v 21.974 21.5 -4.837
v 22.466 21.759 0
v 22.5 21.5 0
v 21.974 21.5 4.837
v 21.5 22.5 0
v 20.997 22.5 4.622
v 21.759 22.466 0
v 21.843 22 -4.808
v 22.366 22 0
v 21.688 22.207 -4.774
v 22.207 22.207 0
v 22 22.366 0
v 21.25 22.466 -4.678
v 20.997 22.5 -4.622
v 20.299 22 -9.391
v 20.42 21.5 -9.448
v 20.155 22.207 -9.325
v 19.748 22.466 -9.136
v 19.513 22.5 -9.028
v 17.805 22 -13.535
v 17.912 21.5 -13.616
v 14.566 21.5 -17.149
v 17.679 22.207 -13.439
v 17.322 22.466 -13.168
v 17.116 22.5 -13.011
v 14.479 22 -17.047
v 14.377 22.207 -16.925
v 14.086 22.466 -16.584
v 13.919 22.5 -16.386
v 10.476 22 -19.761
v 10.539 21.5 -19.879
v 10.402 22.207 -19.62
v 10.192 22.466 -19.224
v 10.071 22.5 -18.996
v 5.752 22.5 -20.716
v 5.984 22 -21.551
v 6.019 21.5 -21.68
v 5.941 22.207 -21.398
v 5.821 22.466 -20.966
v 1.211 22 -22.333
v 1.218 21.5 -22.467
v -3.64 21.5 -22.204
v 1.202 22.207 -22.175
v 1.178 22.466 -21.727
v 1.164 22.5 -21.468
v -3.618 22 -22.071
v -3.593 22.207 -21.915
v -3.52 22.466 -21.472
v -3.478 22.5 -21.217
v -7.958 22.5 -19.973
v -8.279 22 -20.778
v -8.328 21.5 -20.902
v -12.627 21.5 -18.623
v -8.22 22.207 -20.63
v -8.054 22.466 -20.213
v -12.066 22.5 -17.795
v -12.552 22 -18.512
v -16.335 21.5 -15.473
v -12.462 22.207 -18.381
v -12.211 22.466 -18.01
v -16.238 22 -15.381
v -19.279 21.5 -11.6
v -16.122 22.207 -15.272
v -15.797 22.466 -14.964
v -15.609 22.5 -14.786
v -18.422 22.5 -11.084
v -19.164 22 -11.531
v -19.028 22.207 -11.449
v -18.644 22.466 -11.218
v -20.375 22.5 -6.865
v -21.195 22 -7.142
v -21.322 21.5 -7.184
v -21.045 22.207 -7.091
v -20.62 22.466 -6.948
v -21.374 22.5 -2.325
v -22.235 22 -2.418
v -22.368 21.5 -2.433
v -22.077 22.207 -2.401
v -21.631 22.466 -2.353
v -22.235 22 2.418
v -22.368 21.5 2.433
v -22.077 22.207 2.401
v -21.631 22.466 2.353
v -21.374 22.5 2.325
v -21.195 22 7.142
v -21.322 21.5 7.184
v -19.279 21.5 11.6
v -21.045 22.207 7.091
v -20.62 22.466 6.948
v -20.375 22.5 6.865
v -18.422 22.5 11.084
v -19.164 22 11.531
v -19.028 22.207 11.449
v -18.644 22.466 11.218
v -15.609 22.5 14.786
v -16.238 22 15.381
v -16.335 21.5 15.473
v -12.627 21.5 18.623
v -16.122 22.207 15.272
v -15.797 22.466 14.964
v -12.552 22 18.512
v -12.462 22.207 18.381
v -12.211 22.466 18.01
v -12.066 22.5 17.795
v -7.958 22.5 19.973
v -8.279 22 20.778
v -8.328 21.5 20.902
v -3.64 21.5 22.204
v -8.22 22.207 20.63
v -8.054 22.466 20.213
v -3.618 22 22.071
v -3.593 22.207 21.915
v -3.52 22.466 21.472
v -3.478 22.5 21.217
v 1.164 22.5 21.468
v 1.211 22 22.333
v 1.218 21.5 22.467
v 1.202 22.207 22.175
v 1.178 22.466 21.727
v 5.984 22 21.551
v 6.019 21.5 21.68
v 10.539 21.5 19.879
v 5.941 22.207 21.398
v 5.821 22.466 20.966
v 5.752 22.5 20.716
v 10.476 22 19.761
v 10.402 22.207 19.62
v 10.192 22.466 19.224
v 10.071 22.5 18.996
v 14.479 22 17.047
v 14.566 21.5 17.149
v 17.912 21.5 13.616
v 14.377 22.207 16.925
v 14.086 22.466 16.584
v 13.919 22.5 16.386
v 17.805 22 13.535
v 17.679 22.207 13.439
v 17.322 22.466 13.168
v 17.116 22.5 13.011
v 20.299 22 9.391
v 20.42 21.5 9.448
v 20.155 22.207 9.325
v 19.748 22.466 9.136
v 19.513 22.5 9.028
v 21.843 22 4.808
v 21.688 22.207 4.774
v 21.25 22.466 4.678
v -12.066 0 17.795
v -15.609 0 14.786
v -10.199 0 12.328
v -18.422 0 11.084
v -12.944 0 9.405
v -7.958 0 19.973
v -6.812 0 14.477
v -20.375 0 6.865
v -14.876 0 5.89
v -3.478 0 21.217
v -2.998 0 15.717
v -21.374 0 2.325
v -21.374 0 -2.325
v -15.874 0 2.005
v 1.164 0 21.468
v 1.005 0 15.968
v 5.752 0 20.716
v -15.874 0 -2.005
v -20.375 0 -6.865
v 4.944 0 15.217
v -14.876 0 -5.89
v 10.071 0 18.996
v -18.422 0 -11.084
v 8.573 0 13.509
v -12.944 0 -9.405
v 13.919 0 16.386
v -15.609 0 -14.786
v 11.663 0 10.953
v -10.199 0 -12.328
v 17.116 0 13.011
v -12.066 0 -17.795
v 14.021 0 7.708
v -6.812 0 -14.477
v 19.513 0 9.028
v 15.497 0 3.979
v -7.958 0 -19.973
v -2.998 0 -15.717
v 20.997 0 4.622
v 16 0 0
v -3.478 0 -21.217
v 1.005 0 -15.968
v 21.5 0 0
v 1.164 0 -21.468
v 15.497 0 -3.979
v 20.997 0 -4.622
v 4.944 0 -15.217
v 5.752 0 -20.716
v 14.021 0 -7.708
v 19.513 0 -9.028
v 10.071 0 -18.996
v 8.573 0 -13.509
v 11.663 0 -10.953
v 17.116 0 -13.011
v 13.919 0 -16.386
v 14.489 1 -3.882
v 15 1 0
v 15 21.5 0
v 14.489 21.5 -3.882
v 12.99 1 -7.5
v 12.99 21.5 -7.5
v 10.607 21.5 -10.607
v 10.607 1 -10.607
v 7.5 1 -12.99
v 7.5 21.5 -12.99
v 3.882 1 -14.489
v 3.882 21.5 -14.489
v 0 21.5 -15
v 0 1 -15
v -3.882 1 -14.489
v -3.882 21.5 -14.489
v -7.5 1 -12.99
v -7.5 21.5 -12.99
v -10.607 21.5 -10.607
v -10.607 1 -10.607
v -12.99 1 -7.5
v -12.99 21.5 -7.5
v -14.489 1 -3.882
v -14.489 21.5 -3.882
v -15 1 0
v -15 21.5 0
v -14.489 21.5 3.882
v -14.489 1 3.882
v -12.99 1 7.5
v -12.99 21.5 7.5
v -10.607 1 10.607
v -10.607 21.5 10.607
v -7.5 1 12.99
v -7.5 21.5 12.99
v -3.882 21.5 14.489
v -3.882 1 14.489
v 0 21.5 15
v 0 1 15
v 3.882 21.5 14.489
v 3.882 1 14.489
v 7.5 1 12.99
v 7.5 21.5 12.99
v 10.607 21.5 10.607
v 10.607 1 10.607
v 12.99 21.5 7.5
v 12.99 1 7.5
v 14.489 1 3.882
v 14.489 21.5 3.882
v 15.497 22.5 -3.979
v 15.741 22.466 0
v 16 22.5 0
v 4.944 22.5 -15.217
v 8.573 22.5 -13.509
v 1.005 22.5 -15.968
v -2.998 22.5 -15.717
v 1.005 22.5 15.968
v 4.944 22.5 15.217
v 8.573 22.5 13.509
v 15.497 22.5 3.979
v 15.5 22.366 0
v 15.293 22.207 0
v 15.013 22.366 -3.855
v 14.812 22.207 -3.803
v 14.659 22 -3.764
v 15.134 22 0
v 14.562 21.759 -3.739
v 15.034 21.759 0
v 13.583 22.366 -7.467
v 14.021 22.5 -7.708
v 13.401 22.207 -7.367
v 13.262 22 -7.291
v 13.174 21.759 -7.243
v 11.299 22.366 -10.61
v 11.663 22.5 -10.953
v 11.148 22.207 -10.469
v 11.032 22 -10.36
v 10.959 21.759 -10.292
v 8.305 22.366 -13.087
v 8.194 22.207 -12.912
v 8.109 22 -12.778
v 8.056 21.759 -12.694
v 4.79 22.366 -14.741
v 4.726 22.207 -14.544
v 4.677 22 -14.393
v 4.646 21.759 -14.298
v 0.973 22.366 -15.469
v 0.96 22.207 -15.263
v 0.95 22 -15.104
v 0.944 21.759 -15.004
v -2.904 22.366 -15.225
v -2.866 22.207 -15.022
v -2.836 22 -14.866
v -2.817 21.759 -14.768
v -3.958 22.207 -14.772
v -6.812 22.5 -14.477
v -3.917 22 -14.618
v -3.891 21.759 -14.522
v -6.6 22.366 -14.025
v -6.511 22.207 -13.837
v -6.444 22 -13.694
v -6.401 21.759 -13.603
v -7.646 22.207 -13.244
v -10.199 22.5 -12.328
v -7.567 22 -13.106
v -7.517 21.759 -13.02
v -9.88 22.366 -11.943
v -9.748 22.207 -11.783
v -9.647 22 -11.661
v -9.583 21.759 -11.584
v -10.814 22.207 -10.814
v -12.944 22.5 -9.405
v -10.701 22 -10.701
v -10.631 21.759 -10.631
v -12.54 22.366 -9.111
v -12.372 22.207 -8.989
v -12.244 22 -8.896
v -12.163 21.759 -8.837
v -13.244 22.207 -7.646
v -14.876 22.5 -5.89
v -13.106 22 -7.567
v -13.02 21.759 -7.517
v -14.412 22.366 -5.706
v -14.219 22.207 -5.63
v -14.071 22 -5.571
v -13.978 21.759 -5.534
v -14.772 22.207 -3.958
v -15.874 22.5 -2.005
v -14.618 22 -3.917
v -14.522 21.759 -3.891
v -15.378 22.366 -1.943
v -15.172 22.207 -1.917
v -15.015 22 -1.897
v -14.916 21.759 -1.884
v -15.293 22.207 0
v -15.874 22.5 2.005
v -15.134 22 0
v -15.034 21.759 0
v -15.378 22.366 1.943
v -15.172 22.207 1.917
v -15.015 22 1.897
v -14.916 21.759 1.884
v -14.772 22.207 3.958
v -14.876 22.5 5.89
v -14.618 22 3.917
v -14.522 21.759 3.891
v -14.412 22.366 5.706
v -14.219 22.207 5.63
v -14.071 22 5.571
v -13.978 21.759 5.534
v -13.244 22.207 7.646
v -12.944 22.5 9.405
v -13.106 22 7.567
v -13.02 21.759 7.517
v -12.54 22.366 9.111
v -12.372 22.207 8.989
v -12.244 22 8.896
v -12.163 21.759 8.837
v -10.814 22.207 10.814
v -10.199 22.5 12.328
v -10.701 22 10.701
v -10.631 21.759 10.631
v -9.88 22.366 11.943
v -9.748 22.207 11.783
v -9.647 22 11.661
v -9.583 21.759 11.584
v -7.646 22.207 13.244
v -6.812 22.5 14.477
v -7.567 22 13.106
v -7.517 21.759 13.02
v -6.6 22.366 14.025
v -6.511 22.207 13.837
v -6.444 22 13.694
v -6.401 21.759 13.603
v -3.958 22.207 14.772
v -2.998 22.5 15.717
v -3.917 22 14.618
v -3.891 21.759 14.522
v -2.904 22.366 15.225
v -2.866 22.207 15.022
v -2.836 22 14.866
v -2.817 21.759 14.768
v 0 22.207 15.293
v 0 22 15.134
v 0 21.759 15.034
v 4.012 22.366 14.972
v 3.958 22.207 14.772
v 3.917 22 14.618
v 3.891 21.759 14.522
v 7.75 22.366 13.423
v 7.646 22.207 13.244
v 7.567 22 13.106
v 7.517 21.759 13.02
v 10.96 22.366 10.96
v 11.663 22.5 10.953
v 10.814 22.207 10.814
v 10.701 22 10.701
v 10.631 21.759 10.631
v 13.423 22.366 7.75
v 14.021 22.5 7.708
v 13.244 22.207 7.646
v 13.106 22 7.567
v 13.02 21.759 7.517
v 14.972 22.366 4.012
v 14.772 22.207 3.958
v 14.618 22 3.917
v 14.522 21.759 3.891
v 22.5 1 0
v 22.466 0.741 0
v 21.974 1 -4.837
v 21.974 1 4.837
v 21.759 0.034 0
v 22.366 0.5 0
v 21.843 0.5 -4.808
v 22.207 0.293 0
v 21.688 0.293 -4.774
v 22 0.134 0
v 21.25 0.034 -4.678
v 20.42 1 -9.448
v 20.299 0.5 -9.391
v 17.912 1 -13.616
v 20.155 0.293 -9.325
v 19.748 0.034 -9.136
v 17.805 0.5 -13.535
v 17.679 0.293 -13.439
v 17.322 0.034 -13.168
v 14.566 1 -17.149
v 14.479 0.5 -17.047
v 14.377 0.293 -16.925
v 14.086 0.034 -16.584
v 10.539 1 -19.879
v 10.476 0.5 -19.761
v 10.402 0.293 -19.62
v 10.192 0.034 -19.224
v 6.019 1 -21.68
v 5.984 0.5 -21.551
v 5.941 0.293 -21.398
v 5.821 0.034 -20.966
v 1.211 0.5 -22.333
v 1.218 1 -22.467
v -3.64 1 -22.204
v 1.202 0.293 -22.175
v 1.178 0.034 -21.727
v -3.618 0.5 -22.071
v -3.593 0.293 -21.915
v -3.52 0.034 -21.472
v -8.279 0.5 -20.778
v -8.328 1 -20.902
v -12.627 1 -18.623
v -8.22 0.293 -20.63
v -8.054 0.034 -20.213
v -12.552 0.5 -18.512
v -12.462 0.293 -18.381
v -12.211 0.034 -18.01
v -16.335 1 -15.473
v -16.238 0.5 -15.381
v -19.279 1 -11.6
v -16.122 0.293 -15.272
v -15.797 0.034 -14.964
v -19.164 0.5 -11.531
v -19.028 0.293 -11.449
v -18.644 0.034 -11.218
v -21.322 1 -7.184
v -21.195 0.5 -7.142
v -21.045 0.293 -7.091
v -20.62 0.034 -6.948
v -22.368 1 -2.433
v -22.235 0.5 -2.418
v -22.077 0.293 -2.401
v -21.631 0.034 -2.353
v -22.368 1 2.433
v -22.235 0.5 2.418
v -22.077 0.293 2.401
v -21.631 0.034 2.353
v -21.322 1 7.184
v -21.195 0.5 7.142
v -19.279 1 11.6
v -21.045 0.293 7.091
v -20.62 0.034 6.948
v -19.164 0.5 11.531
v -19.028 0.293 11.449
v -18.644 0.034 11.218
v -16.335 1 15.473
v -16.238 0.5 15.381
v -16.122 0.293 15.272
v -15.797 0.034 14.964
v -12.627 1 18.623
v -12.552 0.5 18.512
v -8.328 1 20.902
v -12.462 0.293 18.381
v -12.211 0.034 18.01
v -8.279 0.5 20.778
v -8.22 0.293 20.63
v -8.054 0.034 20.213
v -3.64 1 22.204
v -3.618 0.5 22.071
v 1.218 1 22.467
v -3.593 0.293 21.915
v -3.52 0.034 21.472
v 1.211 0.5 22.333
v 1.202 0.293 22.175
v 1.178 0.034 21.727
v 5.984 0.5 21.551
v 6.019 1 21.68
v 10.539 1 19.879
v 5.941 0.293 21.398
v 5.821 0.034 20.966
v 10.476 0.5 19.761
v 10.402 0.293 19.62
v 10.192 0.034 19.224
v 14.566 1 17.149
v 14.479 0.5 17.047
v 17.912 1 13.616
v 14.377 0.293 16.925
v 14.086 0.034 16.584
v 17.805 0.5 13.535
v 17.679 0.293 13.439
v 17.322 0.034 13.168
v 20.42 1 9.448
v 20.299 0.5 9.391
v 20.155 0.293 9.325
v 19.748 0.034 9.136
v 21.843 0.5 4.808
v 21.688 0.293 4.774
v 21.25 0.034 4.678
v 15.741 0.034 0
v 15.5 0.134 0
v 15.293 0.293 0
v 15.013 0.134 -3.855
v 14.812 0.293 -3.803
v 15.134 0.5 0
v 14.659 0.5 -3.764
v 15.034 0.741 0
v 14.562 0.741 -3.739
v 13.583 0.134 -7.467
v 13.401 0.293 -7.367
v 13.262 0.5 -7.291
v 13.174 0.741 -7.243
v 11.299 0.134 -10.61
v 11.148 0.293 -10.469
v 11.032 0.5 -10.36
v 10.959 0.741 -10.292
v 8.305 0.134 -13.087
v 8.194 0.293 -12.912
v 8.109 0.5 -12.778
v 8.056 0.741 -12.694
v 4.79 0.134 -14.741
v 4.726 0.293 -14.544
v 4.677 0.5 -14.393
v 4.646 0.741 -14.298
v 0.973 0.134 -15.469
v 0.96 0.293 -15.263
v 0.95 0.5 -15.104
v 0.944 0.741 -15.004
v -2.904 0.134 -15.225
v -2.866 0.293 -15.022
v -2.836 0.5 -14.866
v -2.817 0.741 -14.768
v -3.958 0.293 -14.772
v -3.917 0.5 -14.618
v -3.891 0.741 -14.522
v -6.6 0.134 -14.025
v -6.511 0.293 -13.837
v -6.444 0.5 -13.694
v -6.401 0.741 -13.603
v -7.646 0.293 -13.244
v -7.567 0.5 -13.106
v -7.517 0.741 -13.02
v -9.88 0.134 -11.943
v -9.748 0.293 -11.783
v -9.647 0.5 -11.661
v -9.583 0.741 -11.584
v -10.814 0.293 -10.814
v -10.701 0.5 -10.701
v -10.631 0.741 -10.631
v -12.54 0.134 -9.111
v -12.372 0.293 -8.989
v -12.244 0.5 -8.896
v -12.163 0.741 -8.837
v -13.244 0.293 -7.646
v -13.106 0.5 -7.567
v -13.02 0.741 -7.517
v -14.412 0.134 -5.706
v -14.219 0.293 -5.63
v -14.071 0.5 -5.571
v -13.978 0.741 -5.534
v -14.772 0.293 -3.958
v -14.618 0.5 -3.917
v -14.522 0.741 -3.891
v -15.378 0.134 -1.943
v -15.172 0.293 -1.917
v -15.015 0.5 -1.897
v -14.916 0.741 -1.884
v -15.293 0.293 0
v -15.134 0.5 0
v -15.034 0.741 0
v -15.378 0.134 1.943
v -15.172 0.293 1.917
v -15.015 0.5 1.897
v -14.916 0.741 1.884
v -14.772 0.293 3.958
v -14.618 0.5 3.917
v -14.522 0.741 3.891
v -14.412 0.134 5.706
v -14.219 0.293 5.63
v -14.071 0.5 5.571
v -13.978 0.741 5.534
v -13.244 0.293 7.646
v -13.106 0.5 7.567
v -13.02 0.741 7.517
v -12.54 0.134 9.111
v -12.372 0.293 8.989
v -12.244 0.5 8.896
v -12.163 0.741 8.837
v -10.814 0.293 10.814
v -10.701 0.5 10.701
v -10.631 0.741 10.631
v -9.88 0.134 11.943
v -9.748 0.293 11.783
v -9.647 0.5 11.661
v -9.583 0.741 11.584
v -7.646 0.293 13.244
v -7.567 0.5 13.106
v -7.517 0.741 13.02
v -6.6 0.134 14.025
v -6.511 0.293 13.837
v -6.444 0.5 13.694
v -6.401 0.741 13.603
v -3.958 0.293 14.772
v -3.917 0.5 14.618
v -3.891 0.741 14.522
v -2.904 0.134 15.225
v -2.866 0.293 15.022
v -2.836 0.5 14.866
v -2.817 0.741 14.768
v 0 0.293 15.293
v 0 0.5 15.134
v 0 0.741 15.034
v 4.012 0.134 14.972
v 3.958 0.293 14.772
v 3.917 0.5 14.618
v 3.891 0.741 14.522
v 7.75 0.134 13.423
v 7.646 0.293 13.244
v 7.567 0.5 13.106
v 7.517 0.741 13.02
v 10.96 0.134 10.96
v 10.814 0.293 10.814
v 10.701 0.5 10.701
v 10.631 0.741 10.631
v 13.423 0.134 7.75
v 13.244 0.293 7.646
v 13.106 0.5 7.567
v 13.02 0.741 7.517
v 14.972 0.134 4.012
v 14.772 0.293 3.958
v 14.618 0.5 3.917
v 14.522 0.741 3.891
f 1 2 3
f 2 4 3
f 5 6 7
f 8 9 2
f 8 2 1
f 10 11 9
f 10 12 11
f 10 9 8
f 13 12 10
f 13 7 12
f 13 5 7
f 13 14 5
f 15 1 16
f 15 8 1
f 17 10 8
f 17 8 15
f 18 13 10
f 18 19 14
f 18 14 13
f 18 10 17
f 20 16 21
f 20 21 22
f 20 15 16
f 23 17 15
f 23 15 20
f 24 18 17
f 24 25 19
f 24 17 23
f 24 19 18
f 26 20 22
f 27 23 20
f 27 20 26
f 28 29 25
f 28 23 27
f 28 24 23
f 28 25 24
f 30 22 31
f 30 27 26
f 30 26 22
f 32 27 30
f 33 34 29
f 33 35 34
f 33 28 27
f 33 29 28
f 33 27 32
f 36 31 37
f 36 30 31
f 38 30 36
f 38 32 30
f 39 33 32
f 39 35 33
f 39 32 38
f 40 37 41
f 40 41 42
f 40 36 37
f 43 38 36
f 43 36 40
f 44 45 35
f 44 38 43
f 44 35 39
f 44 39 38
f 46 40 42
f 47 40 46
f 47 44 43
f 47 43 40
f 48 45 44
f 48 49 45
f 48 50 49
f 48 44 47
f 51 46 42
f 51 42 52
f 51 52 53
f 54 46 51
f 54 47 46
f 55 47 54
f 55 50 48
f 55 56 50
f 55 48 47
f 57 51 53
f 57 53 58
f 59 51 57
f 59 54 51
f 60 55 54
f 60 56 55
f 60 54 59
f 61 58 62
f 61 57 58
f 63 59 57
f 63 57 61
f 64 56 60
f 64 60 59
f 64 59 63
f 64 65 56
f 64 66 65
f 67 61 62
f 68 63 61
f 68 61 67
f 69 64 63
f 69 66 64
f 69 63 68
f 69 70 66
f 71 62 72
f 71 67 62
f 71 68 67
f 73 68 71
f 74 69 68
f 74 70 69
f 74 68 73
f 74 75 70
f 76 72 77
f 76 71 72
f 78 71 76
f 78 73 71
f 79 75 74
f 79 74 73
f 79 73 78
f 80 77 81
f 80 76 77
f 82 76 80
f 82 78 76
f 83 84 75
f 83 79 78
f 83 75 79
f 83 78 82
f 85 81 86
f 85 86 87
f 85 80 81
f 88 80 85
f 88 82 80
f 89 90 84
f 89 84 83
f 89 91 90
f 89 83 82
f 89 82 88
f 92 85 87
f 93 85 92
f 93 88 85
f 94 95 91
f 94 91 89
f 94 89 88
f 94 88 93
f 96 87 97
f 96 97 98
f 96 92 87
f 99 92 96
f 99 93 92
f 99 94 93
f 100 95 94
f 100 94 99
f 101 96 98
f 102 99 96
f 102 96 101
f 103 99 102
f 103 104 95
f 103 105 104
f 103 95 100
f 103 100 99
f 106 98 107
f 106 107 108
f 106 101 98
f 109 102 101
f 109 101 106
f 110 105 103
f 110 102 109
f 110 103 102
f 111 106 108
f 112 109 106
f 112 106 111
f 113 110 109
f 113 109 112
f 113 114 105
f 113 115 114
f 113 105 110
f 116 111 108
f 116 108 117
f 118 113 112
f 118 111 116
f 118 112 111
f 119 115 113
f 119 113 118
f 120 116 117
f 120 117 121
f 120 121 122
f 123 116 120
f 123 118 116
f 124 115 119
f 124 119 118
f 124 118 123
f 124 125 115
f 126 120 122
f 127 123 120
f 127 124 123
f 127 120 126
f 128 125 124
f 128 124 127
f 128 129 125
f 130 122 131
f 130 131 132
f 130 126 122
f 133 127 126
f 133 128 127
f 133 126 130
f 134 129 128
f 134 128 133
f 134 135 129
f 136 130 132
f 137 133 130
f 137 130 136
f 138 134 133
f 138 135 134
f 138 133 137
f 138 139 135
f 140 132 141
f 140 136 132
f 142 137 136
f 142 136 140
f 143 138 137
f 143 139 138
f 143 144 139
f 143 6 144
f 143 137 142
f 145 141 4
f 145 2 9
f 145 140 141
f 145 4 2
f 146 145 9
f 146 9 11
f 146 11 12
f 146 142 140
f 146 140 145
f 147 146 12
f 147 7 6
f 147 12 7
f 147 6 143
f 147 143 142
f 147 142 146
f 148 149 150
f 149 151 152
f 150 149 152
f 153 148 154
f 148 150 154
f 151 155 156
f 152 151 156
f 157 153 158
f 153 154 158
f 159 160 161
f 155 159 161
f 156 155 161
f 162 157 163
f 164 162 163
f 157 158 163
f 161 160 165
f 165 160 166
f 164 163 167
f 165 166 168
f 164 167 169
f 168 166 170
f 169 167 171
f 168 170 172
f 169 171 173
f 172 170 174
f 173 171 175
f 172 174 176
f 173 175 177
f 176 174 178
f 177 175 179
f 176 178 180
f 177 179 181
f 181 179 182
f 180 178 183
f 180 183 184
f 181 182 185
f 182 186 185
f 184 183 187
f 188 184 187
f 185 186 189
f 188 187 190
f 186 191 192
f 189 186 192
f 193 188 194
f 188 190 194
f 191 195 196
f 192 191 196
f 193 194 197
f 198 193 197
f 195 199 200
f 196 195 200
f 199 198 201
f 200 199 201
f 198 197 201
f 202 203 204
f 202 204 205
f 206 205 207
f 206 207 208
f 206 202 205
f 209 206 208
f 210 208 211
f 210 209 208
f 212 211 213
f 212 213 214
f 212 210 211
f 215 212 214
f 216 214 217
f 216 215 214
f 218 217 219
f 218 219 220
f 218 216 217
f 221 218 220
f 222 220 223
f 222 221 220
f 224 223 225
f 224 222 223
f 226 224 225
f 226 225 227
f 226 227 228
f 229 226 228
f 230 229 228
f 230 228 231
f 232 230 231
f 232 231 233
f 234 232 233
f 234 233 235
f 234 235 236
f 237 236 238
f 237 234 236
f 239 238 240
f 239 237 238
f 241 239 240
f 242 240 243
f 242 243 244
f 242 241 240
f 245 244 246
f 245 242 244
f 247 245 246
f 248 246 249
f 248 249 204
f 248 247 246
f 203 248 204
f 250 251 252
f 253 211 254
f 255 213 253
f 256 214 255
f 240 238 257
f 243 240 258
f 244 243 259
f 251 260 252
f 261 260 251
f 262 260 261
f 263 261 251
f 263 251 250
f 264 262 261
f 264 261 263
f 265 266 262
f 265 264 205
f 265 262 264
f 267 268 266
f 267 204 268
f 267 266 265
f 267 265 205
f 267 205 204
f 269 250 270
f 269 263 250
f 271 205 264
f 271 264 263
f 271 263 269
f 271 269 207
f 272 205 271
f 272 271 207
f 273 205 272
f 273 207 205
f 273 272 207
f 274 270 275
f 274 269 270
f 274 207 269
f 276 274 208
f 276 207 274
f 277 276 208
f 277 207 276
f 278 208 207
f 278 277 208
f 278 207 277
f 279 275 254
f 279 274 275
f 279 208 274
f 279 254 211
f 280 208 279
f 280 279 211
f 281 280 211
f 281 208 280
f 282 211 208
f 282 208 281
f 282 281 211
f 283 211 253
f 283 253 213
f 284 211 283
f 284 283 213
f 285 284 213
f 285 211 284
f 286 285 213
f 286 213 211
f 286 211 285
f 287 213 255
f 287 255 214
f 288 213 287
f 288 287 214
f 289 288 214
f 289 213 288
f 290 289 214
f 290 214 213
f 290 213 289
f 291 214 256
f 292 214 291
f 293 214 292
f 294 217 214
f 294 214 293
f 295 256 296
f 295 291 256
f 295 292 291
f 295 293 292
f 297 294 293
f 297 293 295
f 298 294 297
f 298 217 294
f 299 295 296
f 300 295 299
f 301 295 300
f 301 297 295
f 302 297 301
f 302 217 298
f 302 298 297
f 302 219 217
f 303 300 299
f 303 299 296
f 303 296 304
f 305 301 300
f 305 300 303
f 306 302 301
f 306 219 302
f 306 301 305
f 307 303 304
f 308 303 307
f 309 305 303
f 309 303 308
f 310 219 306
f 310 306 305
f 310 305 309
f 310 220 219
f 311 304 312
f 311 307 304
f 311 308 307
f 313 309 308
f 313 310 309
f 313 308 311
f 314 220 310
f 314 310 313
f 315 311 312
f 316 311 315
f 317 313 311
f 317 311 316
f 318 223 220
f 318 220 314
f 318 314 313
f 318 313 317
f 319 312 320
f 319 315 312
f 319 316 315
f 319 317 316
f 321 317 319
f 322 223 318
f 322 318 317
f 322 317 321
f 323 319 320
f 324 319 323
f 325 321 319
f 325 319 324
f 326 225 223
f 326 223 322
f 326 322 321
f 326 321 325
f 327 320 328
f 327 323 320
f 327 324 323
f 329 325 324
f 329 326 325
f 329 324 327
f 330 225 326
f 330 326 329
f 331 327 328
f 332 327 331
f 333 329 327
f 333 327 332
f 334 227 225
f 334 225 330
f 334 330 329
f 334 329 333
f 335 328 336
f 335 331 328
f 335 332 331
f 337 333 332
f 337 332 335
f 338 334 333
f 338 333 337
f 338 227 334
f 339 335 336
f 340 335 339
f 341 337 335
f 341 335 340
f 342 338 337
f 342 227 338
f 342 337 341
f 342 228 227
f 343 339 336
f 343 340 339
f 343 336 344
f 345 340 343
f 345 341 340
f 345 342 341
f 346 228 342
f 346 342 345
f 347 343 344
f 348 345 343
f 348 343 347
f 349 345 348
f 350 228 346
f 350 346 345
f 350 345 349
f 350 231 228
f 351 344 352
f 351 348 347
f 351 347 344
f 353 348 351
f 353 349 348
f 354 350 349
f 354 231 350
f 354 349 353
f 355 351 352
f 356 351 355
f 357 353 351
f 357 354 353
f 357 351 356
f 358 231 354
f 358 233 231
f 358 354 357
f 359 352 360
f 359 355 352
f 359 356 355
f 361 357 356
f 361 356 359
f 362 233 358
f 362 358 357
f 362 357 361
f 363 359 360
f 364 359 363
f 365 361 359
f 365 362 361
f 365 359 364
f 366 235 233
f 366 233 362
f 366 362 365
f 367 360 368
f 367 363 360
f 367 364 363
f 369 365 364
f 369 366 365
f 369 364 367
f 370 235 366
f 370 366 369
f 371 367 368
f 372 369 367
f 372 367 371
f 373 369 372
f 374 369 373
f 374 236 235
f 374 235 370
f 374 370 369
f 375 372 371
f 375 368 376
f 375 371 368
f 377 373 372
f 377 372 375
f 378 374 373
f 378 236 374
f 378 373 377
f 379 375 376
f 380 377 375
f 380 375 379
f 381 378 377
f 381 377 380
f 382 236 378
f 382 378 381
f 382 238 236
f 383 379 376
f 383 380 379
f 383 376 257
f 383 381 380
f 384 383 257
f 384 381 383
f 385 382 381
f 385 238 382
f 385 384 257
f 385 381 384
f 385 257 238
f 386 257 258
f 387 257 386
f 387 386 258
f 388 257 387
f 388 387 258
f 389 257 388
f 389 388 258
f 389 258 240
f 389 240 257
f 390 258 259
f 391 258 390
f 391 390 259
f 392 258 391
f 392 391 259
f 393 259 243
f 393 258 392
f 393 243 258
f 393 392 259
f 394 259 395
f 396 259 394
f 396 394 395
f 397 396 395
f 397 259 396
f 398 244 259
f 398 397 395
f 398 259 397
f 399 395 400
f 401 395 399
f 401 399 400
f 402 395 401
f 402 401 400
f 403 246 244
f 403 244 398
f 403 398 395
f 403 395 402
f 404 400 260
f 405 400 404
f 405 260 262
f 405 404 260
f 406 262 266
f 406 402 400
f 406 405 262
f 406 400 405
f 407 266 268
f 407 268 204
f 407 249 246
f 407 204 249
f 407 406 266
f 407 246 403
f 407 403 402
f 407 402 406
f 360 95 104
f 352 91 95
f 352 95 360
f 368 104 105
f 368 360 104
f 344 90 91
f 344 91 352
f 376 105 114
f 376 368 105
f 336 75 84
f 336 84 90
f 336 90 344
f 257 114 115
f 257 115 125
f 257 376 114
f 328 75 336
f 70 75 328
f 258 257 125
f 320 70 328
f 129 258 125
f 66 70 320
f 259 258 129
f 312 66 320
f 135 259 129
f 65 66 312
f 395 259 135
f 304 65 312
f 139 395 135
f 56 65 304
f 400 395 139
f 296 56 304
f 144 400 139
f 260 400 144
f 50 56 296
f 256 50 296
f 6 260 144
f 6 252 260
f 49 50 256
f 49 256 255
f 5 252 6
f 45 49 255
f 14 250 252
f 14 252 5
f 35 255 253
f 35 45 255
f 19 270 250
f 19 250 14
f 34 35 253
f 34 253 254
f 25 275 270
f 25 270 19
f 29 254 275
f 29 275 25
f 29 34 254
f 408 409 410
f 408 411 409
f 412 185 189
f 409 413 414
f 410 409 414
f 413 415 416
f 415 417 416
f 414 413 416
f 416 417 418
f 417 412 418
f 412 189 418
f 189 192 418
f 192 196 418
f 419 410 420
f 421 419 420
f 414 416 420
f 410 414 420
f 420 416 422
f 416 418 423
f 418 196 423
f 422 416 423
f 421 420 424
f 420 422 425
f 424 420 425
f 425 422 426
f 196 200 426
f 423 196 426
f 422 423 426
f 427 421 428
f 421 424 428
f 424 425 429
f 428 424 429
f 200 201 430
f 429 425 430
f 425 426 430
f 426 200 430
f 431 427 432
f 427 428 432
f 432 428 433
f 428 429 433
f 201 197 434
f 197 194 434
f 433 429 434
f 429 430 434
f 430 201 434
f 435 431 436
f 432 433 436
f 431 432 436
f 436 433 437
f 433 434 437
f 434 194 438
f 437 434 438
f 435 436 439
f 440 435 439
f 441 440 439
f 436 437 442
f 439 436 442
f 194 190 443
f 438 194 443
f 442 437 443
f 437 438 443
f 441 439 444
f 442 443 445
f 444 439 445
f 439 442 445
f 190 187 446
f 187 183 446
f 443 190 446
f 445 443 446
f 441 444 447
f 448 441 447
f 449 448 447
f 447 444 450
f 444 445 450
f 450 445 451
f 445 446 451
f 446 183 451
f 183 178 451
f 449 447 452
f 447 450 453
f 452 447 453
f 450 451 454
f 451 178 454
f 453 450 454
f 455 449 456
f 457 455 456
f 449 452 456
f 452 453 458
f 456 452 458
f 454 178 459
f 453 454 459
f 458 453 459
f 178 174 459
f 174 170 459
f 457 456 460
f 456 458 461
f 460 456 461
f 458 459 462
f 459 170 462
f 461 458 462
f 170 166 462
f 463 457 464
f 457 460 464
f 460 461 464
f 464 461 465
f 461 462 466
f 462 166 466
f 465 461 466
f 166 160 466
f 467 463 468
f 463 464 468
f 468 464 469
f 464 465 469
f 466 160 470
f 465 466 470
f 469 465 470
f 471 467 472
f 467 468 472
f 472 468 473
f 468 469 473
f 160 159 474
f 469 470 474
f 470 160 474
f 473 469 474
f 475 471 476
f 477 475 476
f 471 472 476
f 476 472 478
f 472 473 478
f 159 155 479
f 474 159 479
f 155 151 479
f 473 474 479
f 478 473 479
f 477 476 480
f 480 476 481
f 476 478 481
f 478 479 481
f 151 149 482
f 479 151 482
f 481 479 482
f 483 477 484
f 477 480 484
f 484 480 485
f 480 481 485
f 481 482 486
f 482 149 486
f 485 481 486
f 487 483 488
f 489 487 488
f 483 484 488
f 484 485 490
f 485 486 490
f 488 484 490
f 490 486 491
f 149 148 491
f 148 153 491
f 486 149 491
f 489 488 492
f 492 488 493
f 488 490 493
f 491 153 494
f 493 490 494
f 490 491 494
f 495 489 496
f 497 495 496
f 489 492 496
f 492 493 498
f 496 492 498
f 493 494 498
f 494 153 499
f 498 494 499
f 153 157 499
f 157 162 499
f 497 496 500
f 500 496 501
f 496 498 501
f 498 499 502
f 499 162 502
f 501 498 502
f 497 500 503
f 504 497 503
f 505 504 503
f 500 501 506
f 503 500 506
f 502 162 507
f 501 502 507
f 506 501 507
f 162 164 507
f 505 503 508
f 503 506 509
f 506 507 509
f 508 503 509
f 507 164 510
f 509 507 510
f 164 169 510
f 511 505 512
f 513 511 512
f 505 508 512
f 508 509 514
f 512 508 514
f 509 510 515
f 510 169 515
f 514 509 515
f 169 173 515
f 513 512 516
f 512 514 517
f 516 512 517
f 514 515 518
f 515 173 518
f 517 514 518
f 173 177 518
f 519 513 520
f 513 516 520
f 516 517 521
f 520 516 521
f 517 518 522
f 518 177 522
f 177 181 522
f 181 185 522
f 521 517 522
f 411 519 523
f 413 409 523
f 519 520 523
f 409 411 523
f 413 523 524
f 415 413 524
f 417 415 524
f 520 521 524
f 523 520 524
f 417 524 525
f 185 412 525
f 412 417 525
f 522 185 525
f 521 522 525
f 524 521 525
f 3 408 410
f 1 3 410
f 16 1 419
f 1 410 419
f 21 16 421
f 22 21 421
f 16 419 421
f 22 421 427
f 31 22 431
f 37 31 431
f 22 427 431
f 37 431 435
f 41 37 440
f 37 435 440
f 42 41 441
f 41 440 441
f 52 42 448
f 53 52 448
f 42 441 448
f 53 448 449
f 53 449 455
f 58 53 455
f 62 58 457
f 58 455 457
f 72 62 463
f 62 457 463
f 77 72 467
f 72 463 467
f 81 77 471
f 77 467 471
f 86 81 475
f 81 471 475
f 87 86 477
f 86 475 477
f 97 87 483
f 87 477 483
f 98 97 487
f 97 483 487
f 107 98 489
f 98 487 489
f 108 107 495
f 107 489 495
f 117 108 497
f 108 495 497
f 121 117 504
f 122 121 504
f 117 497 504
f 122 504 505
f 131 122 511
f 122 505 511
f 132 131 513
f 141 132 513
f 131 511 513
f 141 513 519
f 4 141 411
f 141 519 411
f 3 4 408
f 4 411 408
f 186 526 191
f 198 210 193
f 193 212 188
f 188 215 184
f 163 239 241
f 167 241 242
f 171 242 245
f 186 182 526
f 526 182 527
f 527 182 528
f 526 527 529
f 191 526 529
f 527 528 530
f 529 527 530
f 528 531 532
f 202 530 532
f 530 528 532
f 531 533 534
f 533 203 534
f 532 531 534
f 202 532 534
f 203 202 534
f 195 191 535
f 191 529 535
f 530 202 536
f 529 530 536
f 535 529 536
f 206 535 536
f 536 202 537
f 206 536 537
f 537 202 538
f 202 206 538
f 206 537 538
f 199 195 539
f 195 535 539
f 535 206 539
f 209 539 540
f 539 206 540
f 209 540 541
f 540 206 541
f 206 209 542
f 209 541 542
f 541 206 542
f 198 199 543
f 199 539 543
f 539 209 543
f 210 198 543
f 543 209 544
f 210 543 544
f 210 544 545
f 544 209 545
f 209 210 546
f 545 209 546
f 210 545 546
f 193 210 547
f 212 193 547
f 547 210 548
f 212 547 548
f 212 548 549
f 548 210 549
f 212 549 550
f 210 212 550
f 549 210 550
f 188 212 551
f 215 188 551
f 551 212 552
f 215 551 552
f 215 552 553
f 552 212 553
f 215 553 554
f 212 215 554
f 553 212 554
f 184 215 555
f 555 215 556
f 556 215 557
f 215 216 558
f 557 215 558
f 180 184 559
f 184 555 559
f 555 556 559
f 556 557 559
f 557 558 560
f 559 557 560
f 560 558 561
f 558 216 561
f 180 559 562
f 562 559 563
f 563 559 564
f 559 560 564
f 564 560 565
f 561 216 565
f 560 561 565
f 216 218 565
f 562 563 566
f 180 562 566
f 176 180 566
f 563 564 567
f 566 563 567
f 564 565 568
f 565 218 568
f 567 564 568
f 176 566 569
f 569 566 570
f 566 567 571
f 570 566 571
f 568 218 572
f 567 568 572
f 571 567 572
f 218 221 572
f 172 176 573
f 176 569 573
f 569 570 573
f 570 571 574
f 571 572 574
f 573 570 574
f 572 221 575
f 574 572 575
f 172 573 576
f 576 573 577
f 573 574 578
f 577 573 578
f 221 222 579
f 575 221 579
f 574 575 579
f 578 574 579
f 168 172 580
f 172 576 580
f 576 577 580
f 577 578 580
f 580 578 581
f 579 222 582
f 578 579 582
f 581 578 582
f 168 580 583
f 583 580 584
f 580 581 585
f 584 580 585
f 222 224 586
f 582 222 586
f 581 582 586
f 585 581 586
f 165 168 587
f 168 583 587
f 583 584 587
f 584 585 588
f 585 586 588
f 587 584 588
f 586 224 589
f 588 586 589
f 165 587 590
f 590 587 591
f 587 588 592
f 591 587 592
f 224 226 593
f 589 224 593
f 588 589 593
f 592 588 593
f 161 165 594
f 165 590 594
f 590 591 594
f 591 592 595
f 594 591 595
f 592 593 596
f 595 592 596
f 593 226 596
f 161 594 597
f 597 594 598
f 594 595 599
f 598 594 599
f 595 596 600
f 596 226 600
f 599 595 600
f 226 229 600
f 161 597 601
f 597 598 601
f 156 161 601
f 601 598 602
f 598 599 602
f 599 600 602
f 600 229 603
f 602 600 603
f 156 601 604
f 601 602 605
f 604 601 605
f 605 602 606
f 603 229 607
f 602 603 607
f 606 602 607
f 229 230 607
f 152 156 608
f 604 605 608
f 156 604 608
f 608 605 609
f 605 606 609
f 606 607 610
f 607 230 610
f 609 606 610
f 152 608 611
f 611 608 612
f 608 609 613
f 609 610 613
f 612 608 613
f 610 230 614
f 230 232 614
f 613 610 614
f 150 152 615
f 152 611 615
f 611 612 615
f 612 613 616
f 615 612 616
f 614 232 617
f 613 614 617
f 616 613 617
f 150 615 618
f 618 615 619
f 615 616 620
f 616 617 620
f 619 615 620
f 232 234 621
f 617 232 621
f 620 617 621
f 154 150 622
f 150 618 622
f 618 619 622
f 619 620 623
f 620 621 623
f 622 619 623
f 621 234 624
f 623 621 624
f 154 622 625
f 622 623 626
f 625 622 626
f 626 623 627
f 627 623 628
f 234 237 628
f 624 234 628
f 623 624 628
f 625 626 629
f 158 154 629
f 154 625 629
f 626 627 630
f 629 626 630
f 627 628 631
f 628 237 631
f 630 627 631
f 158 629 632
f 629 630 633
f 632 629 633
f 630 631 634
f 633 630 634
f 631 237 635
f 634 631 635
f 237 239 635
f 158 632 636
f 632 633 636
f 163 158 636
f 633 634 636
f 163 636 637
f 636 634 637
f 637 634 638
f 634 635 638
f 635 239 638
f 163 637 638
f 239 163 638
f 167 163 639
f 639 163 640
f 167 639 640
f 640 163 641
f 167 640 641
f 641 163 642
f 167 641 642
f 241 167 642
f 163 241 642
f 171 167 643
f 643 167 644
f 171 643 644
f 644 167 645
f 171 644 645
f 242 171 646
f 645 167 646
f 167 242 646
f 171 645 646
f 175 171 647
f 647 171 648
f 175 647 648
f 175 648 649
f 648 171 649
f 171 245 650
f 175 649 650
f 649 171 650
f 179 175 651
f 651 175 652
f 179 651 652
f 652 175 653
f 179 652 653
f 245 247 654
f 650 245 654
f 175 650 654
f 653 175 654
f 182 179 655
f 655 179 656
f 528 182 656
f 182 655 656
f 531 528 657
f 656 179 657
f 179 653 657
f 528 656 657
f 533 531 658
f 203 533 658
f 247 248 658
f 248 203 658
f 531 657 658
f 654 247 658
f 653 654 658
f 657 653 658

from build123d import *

# Parameters (mm, degrees)
SKETCH_1_R      = 22.5
SKETCH_1_R_2    = 15
EXTRUDE_1_DEPTH = 22.5
FILLET_1_R      = 1
FILLET_2_R      = 1


with BuildPart() as part:
    # 草图1 → 凸台-拉伸1 (new body)
    with BuildSketch(Plane(origin=(0, 0, 0), x_dir=(1, 0, 0), z_dir=(0, 1, 0))):
        Circle(SKETCH_1_R)
        Circle(SKETCH_1_R_2, mode=Mode.SUBTRACT)
    extrude(amount=EXTRUDE_1_DEPTH)

    # 圆角1
    fillet_1_edges = [part.edges().sort_by_distance(p)[0] for p in [
        (-22.5, 22.5, 0),
    ]]
    fillet(fillet_1_edges, radius=FILLET_1_R)

    # 圆角2
    fillet_2_edges = [part.edges().sort_by_distance(p)[0] for p in [
        (-22.5, 0, 0),
        (-15, 0, 0),
        (-15, 22.5, 0),
    ]]
    fillet(fillet_2_edges, radius=FILLET_2_R)


solid = part.part
